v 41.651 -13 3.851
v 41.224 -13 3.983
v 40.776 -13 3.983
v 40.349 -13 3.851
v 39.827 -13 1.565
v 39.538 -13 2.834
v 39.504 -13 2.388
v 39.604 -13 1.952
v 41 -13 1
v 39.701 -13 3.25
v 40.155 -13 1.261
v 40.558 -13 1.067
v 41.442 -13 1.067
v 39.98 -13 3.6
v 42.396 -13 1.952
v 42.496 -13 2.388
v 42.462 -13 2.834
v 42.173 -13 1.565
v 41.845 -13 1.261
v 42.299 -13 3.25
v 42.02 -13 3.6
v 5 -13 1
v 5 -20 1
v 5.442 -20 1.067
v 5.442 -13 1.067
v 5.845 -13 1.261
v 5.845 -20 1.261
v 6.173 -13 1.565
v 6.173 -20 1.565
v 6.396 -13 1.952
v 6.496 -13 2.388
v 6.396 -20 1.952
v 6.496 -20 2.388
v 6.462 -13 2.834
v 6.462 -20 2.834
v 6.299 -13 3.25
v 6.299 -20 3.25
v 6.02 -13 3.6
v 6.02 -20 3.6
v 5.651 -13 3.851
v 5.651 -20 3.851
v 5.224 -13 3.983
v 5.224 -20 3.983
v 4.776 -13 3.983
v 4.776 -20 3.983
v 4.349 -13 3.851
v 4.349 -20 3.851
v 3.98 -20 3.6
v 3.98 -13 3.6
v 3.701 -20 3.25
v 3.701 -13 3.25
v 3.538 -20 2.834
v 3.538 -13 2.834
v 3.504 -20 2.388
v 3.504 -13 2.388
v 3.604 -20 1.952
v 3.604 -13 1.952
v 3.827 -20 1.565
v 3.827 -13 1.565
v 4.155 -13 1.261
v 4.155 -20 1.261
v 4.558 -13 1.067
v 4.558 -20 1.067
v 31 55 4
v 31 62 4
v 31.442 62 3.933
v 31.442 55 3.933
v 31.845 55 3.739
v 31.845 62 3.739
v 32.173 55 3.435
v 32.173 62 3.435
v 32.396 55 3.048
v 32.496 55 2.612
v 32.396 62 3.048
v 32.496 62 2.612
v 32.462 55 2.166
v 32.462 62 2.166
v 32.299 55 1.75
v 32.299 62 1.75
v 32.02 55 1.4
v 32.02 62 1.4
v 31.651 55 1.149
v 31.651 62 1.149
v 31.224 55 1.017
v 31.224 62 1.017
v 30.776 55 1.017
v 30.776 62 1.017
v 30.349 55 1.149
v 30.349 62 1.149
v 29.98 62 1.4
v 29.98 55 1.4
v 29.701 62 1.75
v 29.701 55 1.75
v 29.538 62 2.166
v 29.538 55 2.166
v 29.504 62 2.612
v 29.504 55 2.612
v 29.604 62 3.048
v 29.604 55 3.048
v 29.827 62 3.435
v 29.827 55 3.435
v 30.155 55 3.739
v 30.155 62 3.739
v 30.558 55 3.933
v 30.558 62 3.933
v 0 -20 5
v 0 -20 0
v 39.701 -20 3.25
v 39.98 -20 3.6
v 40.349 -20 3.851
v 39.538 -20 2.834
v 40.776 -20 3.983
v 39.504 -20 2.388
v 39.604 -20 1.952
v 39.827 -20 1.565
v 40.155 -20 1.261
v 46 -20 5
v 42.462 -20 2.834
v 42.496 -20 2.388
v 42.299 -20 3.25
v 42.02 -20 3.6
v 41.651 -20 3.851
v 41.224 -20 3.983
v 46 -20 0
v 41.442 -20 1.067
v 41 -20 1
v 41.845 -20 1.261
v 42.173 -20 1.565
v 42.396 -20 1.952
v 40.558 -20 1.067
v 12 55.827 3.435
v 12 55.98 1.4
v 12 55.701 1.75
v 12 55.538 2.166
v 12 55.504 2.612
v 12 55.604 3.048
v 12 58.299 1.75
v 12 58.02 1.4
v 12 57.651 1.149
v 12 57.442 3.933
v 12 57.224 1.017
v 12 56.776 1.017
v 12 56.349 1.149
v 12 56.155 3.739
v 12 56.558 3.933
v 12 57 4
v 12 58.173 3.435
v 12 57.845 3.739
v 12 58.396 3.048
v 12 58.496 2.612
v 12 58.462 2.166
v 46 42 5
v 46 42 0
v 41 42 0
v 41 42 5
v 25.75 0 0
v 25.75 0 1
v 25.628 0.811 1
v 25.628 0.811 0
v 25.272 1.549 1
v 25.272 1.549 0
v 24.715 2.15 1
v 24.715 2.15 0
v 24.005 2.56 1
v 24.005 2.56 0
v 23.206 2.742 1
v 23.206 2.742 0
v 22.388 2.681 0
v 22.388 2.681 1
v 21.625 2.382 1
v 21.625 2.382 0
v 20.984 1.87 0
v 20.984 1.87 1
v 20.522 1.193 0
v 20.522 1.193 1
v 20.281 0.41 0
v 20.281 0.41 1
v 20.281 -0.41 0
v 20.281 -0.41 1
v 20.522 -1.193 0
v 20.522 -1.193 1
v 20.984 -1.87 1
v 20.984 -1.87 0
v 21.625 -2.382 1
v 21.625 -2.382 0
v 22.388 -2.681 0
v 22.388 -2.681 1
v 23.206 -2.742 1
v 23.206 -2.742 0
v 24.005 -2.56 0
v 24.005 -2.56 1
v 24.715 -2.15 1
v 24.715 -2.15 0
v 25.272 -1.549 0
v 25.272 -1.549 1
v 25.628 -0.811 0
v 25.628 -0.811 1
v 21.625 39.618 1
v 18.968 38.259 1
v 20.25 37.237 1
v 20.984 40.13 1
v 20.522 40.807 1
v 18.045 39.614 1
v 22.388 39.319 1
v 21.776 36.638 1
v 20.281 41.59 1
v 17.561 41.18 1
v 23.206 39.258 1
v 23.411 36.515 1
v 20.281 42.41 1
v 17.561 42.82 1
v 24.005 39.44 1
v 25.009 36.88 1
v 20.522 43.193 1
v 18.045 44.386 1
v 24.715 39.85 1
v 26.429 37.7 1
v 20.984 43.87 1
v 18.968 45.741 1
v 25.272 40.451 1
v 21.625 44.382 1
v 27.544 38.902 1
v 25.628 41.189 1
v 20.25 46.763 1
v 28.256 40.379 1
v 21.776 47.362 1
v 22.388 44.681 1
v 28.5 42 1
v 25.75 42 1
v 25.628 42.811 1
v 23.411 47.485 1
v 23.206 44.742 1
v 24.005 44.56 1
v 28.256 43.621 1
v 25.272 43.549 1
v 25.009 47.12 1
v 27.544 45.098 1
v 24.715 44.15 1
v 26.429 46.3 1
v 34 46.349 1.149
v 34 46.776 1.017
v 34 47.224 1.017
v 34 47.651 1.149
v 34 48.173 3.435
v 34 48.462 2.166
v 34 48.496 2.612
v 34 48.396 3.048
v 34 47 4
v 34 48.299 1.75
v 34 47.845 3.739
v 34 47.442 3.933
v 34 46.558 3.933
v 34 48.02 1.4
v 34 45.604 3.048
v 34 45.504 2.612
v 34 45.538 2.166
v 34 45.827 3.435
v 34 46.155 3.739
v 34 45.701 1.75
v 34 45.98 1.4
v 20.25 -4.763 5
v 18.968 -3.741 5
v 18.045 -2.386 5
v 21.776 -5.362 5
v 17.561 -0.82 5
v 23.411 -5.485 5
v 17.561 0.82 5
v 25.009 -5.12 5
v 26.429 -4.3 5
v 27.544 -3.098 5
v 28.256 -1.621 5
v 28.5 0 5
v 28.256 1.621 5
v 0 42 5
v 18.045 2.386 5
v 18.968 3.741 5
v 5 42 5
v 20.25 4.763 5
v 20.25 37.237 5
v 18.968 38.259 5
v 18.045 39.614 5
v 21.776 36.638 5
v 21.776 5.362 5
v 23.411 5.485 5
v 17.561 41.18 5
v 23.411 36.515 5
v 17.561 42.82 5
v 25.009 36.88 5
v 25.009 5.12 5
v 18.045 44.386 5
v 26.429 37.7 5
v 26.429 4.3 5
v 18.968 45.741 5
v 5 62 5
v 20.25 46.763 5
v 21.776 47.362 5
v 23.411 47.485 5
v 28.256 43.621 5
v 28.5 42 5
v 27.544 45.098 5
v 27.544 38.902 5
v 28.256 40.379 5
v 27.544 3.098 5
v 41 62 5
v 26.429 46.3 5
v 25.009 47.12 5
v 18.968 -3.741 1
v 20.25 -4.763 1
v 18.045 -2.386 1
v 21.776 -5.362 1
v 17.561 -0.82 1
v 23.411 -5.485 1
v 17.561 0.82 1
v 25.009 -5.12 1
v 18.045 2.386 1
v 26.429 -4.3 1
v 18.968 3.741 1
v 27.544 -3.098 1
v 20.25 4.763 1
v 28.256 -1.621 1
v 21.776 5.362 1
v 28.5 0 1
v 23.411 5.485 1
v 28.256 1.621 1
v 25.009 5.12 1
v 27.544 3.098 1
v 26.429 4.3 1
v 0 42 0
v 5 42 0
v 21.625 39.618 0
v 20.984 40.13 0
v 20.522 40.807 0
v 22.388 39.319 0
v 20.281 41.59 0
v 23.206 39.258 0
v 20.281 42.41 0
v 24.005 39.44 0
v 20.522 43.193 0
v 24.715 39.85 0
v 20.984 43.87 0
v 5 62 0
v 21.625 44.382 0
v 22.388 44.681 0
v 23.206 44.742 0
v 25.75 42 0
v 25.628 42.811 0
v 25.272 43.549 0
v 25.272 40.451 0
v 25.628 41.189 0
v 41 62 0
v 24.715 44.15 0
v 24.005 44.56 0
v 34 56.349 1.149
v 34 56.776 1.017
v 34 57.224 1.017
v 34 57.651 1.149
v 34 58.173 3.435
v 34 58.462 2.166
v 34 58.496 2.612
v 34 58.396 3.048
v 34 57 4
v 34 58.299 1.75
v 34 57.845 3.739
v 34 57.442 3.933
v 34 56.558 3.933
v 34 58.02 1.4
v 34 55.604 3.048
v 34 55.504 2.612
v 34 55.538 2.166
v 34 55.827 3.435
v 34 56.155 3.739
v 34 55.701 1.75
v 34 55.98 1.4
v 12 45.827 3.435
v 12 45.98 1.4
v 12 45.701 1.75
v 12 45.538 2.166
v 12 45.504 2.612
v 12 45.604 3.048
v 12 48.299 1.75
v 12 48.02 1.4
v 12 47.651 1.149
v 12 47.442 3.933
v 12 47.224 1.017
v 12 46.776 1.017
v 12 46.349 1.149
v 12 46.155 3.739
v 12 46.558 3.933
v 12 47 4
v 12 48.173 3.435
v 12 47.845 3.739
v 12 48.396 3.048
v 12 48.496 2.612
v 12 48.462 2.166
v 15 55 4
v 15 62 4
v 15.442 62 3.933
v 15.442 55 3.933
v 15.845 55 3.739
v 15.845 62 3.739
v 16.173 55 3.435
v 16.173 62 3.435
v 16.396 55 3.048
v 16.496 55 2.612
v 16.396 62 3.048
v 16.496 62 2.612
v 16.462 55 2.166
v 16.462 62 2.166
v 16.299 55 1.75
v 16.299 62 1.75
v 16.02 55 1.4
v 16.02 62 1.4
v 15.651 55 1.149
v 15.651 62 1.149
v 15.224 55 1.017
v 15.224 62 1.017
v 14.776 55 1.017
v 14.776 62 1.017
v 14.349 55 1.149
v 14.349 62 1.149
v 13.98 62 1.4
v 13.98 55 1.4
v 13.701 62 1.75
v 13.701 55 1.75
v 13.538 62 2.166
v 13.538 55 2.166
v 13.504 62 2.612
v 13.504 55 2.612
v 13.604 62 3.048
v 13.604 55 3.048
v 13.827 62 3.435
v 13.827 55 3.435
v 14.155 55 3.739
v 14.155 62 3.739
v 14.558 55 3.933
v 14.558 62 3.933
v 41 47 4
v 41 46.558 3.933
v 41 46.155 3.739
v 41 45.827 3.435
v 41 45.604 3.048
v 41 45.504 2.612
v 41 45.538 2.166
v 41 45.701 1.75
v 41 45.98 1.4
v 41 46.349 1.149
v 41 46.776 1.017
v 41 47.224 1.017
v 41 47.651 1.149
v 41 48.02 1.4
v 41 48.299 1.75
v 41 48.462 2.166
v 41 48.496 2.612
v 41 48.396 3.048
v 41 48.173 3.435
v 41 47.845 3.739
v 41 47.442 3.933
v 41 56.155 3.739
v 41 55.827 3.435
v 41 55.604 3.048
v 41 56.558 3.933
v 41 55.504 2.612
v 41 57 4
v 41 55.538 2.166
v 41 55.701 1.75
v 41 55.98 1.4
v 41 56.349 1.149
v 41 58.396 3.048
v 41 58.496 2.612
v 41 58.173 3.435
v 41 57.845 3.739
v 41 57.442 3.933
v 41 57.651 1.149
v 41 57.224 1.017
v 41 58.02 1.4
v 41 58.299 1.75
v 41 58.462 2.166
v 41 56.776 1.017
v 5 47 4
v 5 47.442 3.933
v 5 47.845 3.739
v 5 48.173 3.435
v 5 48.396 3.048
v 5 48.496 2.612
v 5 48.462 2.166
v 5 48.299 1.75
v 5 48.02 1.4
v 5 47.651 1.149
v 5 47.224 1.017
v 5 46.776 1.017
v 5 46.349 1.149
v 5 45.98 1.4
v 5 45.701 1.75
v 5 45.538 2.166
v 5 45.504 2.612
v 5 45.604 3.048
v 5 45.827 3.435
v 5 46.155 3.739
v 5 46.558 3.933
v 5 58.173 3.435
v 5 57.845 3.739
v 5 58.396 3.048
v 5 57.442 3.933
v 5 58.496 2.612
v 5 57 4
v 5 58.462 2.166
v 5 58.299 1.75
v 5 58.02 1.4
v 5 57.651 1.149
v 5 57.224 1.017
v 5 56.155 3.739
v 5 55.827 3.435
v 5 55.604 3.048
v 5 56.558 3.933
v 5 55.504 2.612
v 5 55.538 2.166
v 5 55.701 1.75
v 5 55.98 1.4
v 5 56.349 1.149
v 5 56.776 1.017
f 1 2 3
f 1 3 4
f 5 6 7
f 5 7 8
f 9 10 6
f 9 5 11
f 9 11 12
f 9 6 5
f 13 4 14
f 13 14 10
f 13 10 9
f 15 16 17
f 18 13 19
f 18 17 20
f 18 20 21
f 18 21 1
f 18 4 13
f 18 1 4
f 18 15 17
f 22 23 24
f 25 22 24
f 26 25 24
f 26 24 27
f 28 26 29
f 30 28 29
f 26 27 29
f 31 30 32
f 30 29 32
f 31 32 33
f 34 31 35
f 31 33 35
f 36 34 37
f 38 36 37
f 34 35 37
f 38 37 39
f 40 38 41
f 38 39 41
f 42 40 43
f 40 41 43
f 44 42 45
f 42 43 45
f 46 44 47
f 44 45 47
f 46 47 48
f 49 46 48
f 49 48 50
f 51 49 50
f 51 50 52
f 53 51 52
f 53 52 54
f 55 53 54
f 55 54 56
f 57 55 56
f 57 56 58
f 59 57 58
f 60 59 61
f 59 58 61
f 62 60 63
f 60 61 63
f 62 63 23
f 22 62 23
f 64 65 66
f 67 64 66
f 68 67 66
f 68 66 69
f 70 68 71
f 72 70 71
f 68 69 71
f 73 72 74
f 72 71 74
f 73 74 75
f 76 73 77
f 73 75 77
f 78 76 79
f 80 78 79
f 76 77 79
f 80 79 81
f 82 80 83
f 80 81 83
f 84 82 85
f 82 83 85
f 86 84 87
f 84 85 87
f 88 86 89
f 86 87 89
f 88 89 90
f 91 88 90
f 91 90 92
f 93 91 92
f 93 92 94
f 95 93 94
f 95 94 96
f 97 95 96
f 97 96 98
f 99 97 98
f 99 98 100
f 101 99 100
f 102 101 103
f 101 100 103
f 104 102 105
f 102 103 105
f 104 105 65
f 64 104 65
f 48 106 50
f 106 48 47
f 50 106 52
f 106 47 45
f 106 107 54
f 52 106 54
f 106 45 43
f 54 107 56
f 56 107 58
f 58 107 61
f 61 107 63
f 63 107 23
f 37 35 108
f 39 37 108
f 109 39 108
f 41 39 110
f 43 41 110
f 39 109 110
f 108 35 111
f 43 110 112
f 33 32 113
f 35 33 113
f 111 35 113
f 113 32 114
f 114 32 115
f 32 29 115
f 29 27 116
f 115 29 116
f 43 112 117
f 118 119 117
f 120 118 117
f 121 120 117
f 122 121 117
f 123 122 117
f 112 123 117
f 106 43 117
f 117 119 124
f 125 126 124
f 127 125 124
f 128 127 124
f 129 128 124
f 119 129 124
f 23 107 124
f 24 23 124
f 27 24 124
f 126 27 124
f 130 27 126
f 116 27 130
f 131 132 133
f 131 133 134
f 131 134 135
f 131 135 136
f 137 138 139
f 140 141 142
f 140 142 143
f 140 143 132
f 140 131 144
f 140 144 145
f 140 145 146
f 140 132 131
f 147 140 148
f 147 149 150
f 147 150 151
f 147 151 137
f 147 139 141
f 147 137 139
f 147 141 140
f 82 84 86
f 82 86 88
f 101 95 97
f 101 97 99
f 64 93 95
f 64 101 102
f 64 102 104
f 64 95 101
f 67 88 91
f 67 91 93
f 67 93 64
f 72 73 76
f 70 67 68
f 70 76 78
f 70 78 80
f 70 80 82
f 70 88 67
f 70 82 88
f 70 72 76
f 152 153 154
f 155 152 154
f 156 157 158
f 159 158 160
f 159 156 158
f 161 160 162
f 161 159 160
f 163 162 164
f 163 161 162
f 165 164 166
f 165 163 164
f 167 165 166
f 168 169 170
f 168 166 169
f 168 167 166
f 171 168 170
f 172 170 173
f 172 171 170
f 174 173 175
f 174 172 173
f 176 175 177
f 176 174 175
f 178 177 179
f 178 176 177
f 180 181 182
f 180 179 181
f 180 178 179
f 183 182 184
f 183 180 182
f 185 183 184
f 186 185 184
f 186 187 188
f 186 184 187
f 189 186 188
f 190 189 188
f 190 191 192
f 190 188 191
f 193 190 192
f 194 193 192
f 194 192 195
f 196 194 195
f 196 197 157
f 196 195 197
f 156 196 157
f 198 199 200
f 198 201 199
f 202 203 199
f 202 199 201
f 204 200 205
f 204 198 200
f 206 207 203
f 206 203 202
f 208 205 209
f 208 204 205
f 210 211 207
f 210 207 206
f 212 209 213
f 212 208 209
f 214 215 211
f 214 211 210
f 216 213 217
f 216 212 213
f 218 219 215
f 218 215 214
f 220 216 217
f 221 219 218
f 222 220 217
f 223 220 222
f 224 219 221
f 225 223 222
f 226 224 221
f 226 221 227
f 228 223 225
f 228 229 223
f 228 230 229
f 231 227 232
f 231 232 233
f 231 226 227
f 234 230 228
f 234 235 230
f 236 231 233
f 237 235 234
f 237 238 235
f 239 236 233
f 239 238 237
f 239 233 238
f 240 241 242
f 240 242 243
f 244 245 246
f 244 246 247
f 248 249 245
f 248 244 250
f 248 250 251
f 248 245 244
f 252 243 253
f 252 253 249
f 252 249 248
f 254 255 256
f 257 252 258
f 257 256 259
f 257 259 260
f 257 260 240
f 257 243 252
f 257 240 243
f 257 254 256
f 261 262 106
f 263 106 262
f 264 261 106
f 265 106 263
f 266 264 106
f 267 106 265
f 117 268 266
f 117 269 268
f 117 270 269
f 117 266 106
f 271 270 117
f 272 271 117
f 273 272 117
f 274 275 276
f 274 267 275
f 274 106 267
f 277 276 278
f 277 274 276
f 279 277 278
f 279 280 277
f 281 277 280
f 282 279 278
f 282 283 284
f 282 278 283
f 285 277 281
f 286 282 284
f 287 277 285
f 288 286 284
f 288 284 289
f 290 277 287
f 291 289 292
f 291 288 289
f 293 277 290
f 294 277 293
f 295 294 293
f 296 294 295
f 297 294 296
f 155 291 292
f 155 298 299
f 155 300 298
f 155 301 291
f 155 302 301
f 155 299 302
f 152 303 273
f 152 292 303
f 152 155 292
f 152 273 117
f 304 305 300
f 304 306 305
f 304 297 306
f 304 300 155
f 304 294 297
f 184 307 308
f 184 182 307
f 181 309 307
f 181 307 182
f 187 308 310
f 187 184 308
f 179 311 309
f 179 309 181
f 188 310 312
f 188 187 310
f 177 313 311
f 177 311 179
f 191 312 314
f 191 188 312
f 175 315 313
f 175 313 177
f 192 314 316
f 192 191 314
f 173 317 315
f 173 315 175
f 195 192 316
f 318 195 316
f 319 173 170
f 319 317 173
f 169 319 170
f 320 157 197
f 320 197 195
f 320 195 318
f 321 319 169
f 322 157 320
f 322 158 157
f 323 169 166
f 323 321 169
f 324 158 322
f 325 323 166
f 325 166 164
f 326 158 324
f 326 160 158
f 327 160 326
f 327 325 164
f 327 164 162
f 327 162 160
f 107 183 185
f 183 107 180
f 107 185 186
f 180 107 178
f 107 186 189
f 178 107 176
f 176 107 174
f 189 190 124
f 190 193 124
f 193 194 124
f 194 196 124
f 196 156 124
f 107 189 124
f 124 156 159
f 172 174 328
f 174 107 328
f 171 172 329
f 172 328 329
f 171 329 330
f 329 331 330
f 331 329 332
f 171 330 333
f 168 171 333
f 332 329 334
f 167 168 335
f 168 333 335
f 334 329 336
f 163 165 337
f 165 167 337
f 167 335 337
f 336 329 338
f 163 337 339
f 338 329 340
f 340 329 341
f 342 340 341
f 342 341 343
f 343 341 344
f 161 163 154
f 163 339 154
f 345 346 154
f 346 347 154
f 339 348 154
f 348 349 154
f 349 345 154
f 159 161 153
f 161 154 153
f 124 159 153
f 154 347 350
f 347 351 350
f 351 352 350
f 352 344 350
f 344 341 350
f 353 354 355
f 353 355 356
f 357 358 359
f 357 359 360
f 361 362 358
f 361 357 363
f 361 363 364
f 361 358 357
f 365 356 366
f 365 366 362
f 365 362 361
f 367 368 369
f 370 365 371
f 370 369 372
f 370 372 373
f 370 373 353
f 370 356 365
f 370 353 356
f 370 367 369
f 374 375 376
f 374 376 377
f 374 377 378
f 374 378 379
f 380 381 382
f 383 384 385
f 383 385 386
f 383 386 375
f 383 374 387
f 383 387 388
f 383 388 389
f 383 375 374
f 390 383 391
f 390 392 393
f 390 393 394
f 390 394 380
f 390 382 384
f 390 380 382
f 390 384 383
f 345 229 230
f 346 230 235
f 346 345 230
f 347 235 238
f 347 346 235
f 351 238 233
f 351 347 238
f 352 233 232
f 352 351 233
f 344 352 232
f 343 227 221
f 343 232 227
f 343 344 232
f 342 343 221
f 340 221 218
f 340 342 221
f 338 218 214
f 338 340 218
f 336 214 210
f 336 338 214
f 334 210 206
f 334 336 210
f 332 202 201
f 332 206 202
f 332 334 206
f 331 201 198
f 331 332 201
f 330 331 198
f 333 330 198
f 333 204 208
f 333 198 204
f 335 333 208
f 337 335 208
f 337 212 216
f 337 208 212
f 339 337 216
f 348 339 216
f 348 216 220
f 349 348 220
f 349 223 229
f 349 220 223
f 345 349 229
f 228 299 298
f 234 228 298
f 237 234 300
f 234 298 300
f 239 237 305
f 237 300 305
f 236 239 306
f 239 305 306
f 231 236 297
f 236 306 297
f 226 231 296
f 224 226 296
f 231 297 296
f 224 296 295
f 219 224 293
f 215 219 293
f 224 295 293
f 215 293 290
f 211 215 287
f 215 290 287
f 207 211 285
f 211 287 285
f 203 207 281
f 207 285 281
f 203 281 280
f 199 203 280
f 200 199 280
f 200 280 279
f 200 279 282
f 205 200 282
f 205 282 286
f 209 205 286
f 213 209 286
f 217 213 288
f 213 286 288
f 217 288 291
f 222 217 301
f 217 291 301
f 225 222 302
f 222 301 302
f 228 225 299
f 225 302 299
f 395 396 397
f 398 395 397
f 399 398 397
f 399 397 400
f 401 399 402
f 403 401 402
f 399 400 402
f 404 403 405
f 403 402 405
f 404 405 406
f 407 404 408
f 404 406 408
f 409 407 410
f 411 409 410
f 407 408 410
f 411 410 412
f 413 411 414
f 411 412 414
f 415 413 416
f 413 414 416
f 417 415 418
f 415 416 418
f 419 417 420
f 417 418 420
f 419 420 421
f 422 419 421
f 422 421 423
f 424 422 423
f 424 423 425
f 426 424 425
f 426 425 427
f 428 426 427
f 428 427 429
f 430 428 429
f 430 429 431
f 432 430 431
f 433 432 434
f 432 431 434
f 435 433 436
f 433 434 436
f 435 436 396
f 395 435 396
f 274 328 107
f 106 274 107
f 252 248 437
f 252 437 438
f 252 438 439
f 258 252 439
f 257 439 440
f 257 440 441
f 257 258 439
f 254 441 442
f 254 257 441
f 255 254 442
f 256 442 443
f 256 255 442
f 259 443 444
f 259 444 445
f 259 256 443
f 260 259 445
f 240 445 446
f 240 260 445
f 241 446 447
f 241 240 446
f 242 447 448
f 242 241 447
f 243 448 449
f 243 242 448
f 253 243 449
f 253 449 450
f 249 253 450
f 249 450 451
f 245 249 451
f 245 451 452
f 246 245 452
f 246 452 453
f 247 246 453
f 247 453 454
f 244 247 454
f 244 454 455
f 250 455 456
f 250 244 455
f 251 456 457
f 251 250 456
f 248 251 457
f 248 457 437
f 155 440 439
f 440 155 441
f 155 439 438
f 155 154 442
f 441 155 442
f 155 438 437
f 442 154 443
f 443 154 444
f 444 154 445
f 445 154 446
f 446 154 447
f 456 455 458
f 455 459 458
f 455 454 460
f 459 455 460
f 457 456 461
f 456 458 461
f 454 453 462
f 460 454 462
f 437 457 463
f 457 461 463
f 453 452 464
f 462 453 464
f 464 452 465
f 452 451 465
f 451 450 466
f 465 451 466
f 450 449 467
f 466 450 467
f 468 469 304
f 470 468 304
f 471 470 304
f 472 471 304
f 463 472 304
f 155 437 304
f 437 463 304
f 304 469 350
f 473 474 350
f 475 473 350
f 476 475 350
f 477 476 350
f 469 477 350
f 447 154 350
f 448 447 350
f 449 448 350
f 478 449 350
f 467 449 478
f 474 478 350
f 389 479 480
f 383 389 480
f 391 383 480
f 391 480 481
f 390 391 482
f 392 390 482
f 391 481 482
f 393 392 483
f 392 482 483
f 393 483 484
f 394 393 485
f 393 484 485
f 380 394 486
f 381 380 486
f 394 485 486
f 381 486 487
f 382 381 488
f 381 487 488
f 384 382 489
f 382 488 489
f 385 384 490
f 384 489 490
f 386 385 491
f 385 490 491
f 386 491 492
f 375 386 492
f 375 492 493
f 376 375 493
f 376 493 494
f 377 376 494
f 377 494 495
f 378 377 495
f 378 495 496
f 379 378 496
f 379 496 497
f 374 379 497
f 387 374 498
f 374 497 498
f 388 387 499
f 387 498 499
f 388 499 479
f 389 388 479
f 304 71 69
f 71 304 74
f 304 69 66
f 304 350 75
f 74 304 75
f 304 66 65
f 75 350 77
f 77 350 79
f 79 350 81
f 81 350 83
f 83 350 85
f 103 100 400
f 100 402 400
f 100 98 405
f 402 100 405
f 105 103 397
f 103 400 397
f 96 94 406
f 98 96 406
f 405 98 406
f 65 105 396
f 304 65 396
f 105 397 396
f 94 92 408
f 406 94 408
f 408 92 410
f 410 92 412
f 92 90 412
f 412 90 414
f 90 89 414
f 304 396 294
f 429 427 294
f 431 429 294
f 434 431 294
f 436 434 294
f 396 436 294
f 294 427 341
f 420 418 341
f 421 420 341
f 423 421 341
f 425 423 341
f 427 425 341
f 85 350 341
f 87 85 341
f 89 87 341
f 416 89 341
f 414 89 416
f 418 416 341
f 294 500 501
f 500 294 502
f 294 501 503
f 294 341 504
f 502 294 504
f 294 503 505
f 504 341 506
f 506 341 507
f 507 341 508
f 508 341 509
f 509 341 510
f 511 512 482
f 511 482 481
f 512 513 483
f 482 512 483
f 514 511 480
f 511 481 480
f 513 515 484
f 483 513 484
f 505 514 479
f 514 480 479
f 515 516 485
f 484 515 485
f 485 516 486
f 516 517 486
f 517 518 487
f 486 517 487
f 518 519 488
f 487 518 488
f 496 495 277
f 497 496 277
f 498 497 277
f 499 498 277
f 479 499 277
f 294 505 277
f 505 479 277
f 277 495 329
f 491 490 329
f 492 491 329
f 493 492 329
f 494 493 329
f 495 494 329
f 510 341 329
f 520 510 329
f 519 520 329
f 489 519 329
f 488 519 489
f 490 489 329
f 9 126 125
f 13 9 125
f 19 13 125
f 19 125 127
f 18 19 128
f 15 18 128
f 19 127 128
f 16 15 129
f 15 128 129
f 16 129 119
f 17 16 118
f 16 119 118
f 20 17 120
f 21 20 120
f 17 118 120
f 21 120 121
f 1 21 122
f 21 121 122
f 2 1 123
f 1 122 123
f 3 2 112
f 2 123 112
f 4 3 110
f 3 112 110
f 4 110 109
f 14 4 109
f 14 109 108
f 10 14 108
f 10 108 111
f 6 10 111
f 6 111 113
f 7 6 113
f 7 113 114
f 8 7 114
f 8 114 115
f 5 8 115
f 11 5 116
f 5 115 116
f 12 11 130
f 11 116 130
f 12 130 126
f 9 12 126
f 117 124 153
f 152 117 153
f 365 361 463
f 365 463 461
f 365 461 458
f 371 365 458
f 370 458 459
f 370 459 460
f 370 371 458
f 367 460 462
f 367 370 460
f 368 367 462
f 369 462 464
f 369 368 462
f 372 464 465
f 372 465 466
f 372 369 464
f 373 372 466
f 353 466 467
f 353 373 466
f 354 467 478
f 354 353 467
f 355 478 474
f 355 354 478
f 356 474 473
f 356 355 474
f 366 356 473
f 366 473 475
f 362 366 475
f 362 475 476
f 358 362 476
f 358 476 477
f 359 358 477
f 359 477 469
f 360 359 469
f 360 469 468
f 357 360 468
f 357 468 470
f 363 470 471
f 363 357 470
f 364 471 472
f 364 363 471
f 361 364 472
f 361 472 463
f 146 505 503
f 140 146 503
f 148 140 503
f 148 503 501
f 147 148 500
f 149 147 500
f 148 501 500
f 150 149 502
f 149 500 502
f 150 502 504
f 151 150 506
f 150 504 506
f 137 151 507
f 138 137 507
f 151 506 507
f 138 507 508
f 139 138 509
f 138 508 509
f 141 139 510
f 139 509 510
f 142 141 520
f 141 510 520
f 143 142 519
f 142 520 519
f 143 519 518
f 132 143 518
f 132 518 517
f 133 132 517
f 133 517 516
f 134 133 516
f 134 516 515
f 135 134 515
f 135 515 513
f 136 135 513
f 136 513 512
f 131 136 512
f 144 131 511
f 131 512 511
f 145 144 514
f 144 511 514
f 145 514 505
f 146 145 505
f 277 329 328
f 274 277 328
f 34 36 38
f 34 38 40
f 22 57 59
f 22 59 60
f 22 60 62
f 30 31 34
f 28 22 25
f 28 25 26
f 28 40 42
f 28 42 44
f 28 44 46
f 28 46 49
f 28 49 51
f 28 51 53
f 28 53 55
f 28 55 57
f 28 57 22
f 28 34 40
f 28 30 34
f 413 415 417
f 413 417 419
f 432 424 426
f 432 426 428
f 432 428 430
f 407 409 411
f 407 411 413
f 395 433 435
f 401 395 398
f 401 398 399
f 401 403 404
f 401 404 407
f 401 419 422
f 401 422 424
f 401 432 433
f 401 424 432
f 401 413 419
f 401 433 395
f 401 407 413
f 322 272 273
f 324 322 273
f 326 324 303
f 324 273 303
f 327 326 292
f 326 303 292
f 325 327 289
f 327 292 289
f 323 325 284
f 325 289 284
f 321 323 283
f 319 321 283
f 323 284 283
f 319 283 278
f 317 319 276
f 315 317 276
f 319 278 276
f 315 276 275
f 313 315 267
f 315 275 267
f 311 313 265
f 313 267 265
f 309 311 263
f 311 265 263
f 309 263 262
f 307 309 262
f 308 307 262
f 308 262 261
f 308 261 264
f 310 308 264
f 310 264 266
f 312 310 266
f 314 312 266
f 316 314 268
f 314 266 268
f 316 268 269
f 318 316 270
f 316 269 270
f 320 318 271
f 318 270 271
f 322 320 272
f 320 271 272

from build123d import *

# Parameters (mm, degrees)
SKETCH1_R           = 2.75
BOSS_EXTRUDE1_DEPTH = 5
SKETCH3_R           = 5.5
CUT_EXTRUDE2_DEPTH  = 4
SKETCH5_R           = 1.5
CUT_EXTRUDE3_DEPTH  = 7
SKETCH6_R           = 1.5
CUT_EXTRUDE4_DEPTH  = 7
CUT_EXTRUDE5_START  = -7
SKETCH7_R           = 1.5
CUT_EXTRUDE5_DEPTH  = 7
SKETCH8_R           = 1.5
CUT_EXTRUDE6_DEPTH  = 7


with BuildPart() as part:
    # Sketch1 → Boss-Extrude1 (new body)
    with BuildSketch(Plane.XY):
        Polygon((0, 42), (0, -20), (46, -20), (46, 42), (41, 42), (41, 62), (5, 62), (5, 42), align=None)
        with Locations((23, 42)):
            Circle(SKETCH1_R, mode=Mode.SUBTRACT)
        with Locations((23, 0)):
            Circle(SKETCH1_R, mode=Mode.SUBTRACT)
    extrude(amount=BOSS_EXTRUDE1_DEPTH)

    # Sketch3 → Cut-Extrude2 (cut)
    with BuildSketch(Plane.XY.offset(5)):
        with Locations((23, 42)):
            Circle(SKETCH3_R)
        with Locations((23, 0)):
            Circle(SKETCH3_R)
    extrude(amount=-CUT_EXTRUDE2_DEPTH, mode=Mode.SUBTRACT)

    # Sketch5 → Cut-Extrude3 (cut)
    with BuildSketch(Plane.XZ.offset(20)):
        with Locations(Location((5, 2.5, 0), (0, 0, 270))):
            Circle(SKETCH5_R)
        with Locations(Location((41, 2.5, 0), (0, 0, 270))):
            Circle(SKETCH5_R)
    extrude(amount=-CUT_EXTRUDE3_DEPTH, mode=Mode.SUBTRACT)

    # Sketch6 → Cut-Extrude4 (cut)
    with BuildSketch(Plane.ZY.offset(-5)):
        with Locations((2.5, 47)):
            Circle(SKETCH6_R)
        with Locations((2.5, 57)):
            Circle(SKETCH6_R)
    extrude(amount=-CUT_EXTRUDE4_DEPTH, mode=Mode.SUBTRACT)

    # Sketch7 → Cut-Extrude5 (cut)
    with BuildSketch(Plane(origin=(41, 0, 0), x_dir=(0, 0, -1), z_dir=(1, 0, 0)).offset(CUT_EXTRUDE5_START)):
        with Locations(Location((-2.5, 47, 0), (0, 0, 180))):
            Circle(SKETCH7_R)
        with Locations(Location((-2.5, 57, 0), (0, 0, 180))):
            Circle(SKETCH7_R)
    extrude(amount=CUT_EXTRUDE5_DEPTH, mode=Mode.SUBTRACT)

    # Sketch8 → Cut-Extrude6 (cut)
    with BuildSketch(Plane(origin=(0, 62, 0), x_dir=(1, 0, 0), z_dir=(0, 1, 0))):
        with Locations(Location((15, -2.5, 0), (0, 0, 270))):
            Circle(SKETCH8_R)
        with Locations(Location((31, -2.5, 0), (0, 0, 270))):
            Circle(SKETCH8_R)
    extrude(amount=-CUT_EXTRUDE6_DEPTH, mode=Mode.SUBTRACT)


solid = part.part
